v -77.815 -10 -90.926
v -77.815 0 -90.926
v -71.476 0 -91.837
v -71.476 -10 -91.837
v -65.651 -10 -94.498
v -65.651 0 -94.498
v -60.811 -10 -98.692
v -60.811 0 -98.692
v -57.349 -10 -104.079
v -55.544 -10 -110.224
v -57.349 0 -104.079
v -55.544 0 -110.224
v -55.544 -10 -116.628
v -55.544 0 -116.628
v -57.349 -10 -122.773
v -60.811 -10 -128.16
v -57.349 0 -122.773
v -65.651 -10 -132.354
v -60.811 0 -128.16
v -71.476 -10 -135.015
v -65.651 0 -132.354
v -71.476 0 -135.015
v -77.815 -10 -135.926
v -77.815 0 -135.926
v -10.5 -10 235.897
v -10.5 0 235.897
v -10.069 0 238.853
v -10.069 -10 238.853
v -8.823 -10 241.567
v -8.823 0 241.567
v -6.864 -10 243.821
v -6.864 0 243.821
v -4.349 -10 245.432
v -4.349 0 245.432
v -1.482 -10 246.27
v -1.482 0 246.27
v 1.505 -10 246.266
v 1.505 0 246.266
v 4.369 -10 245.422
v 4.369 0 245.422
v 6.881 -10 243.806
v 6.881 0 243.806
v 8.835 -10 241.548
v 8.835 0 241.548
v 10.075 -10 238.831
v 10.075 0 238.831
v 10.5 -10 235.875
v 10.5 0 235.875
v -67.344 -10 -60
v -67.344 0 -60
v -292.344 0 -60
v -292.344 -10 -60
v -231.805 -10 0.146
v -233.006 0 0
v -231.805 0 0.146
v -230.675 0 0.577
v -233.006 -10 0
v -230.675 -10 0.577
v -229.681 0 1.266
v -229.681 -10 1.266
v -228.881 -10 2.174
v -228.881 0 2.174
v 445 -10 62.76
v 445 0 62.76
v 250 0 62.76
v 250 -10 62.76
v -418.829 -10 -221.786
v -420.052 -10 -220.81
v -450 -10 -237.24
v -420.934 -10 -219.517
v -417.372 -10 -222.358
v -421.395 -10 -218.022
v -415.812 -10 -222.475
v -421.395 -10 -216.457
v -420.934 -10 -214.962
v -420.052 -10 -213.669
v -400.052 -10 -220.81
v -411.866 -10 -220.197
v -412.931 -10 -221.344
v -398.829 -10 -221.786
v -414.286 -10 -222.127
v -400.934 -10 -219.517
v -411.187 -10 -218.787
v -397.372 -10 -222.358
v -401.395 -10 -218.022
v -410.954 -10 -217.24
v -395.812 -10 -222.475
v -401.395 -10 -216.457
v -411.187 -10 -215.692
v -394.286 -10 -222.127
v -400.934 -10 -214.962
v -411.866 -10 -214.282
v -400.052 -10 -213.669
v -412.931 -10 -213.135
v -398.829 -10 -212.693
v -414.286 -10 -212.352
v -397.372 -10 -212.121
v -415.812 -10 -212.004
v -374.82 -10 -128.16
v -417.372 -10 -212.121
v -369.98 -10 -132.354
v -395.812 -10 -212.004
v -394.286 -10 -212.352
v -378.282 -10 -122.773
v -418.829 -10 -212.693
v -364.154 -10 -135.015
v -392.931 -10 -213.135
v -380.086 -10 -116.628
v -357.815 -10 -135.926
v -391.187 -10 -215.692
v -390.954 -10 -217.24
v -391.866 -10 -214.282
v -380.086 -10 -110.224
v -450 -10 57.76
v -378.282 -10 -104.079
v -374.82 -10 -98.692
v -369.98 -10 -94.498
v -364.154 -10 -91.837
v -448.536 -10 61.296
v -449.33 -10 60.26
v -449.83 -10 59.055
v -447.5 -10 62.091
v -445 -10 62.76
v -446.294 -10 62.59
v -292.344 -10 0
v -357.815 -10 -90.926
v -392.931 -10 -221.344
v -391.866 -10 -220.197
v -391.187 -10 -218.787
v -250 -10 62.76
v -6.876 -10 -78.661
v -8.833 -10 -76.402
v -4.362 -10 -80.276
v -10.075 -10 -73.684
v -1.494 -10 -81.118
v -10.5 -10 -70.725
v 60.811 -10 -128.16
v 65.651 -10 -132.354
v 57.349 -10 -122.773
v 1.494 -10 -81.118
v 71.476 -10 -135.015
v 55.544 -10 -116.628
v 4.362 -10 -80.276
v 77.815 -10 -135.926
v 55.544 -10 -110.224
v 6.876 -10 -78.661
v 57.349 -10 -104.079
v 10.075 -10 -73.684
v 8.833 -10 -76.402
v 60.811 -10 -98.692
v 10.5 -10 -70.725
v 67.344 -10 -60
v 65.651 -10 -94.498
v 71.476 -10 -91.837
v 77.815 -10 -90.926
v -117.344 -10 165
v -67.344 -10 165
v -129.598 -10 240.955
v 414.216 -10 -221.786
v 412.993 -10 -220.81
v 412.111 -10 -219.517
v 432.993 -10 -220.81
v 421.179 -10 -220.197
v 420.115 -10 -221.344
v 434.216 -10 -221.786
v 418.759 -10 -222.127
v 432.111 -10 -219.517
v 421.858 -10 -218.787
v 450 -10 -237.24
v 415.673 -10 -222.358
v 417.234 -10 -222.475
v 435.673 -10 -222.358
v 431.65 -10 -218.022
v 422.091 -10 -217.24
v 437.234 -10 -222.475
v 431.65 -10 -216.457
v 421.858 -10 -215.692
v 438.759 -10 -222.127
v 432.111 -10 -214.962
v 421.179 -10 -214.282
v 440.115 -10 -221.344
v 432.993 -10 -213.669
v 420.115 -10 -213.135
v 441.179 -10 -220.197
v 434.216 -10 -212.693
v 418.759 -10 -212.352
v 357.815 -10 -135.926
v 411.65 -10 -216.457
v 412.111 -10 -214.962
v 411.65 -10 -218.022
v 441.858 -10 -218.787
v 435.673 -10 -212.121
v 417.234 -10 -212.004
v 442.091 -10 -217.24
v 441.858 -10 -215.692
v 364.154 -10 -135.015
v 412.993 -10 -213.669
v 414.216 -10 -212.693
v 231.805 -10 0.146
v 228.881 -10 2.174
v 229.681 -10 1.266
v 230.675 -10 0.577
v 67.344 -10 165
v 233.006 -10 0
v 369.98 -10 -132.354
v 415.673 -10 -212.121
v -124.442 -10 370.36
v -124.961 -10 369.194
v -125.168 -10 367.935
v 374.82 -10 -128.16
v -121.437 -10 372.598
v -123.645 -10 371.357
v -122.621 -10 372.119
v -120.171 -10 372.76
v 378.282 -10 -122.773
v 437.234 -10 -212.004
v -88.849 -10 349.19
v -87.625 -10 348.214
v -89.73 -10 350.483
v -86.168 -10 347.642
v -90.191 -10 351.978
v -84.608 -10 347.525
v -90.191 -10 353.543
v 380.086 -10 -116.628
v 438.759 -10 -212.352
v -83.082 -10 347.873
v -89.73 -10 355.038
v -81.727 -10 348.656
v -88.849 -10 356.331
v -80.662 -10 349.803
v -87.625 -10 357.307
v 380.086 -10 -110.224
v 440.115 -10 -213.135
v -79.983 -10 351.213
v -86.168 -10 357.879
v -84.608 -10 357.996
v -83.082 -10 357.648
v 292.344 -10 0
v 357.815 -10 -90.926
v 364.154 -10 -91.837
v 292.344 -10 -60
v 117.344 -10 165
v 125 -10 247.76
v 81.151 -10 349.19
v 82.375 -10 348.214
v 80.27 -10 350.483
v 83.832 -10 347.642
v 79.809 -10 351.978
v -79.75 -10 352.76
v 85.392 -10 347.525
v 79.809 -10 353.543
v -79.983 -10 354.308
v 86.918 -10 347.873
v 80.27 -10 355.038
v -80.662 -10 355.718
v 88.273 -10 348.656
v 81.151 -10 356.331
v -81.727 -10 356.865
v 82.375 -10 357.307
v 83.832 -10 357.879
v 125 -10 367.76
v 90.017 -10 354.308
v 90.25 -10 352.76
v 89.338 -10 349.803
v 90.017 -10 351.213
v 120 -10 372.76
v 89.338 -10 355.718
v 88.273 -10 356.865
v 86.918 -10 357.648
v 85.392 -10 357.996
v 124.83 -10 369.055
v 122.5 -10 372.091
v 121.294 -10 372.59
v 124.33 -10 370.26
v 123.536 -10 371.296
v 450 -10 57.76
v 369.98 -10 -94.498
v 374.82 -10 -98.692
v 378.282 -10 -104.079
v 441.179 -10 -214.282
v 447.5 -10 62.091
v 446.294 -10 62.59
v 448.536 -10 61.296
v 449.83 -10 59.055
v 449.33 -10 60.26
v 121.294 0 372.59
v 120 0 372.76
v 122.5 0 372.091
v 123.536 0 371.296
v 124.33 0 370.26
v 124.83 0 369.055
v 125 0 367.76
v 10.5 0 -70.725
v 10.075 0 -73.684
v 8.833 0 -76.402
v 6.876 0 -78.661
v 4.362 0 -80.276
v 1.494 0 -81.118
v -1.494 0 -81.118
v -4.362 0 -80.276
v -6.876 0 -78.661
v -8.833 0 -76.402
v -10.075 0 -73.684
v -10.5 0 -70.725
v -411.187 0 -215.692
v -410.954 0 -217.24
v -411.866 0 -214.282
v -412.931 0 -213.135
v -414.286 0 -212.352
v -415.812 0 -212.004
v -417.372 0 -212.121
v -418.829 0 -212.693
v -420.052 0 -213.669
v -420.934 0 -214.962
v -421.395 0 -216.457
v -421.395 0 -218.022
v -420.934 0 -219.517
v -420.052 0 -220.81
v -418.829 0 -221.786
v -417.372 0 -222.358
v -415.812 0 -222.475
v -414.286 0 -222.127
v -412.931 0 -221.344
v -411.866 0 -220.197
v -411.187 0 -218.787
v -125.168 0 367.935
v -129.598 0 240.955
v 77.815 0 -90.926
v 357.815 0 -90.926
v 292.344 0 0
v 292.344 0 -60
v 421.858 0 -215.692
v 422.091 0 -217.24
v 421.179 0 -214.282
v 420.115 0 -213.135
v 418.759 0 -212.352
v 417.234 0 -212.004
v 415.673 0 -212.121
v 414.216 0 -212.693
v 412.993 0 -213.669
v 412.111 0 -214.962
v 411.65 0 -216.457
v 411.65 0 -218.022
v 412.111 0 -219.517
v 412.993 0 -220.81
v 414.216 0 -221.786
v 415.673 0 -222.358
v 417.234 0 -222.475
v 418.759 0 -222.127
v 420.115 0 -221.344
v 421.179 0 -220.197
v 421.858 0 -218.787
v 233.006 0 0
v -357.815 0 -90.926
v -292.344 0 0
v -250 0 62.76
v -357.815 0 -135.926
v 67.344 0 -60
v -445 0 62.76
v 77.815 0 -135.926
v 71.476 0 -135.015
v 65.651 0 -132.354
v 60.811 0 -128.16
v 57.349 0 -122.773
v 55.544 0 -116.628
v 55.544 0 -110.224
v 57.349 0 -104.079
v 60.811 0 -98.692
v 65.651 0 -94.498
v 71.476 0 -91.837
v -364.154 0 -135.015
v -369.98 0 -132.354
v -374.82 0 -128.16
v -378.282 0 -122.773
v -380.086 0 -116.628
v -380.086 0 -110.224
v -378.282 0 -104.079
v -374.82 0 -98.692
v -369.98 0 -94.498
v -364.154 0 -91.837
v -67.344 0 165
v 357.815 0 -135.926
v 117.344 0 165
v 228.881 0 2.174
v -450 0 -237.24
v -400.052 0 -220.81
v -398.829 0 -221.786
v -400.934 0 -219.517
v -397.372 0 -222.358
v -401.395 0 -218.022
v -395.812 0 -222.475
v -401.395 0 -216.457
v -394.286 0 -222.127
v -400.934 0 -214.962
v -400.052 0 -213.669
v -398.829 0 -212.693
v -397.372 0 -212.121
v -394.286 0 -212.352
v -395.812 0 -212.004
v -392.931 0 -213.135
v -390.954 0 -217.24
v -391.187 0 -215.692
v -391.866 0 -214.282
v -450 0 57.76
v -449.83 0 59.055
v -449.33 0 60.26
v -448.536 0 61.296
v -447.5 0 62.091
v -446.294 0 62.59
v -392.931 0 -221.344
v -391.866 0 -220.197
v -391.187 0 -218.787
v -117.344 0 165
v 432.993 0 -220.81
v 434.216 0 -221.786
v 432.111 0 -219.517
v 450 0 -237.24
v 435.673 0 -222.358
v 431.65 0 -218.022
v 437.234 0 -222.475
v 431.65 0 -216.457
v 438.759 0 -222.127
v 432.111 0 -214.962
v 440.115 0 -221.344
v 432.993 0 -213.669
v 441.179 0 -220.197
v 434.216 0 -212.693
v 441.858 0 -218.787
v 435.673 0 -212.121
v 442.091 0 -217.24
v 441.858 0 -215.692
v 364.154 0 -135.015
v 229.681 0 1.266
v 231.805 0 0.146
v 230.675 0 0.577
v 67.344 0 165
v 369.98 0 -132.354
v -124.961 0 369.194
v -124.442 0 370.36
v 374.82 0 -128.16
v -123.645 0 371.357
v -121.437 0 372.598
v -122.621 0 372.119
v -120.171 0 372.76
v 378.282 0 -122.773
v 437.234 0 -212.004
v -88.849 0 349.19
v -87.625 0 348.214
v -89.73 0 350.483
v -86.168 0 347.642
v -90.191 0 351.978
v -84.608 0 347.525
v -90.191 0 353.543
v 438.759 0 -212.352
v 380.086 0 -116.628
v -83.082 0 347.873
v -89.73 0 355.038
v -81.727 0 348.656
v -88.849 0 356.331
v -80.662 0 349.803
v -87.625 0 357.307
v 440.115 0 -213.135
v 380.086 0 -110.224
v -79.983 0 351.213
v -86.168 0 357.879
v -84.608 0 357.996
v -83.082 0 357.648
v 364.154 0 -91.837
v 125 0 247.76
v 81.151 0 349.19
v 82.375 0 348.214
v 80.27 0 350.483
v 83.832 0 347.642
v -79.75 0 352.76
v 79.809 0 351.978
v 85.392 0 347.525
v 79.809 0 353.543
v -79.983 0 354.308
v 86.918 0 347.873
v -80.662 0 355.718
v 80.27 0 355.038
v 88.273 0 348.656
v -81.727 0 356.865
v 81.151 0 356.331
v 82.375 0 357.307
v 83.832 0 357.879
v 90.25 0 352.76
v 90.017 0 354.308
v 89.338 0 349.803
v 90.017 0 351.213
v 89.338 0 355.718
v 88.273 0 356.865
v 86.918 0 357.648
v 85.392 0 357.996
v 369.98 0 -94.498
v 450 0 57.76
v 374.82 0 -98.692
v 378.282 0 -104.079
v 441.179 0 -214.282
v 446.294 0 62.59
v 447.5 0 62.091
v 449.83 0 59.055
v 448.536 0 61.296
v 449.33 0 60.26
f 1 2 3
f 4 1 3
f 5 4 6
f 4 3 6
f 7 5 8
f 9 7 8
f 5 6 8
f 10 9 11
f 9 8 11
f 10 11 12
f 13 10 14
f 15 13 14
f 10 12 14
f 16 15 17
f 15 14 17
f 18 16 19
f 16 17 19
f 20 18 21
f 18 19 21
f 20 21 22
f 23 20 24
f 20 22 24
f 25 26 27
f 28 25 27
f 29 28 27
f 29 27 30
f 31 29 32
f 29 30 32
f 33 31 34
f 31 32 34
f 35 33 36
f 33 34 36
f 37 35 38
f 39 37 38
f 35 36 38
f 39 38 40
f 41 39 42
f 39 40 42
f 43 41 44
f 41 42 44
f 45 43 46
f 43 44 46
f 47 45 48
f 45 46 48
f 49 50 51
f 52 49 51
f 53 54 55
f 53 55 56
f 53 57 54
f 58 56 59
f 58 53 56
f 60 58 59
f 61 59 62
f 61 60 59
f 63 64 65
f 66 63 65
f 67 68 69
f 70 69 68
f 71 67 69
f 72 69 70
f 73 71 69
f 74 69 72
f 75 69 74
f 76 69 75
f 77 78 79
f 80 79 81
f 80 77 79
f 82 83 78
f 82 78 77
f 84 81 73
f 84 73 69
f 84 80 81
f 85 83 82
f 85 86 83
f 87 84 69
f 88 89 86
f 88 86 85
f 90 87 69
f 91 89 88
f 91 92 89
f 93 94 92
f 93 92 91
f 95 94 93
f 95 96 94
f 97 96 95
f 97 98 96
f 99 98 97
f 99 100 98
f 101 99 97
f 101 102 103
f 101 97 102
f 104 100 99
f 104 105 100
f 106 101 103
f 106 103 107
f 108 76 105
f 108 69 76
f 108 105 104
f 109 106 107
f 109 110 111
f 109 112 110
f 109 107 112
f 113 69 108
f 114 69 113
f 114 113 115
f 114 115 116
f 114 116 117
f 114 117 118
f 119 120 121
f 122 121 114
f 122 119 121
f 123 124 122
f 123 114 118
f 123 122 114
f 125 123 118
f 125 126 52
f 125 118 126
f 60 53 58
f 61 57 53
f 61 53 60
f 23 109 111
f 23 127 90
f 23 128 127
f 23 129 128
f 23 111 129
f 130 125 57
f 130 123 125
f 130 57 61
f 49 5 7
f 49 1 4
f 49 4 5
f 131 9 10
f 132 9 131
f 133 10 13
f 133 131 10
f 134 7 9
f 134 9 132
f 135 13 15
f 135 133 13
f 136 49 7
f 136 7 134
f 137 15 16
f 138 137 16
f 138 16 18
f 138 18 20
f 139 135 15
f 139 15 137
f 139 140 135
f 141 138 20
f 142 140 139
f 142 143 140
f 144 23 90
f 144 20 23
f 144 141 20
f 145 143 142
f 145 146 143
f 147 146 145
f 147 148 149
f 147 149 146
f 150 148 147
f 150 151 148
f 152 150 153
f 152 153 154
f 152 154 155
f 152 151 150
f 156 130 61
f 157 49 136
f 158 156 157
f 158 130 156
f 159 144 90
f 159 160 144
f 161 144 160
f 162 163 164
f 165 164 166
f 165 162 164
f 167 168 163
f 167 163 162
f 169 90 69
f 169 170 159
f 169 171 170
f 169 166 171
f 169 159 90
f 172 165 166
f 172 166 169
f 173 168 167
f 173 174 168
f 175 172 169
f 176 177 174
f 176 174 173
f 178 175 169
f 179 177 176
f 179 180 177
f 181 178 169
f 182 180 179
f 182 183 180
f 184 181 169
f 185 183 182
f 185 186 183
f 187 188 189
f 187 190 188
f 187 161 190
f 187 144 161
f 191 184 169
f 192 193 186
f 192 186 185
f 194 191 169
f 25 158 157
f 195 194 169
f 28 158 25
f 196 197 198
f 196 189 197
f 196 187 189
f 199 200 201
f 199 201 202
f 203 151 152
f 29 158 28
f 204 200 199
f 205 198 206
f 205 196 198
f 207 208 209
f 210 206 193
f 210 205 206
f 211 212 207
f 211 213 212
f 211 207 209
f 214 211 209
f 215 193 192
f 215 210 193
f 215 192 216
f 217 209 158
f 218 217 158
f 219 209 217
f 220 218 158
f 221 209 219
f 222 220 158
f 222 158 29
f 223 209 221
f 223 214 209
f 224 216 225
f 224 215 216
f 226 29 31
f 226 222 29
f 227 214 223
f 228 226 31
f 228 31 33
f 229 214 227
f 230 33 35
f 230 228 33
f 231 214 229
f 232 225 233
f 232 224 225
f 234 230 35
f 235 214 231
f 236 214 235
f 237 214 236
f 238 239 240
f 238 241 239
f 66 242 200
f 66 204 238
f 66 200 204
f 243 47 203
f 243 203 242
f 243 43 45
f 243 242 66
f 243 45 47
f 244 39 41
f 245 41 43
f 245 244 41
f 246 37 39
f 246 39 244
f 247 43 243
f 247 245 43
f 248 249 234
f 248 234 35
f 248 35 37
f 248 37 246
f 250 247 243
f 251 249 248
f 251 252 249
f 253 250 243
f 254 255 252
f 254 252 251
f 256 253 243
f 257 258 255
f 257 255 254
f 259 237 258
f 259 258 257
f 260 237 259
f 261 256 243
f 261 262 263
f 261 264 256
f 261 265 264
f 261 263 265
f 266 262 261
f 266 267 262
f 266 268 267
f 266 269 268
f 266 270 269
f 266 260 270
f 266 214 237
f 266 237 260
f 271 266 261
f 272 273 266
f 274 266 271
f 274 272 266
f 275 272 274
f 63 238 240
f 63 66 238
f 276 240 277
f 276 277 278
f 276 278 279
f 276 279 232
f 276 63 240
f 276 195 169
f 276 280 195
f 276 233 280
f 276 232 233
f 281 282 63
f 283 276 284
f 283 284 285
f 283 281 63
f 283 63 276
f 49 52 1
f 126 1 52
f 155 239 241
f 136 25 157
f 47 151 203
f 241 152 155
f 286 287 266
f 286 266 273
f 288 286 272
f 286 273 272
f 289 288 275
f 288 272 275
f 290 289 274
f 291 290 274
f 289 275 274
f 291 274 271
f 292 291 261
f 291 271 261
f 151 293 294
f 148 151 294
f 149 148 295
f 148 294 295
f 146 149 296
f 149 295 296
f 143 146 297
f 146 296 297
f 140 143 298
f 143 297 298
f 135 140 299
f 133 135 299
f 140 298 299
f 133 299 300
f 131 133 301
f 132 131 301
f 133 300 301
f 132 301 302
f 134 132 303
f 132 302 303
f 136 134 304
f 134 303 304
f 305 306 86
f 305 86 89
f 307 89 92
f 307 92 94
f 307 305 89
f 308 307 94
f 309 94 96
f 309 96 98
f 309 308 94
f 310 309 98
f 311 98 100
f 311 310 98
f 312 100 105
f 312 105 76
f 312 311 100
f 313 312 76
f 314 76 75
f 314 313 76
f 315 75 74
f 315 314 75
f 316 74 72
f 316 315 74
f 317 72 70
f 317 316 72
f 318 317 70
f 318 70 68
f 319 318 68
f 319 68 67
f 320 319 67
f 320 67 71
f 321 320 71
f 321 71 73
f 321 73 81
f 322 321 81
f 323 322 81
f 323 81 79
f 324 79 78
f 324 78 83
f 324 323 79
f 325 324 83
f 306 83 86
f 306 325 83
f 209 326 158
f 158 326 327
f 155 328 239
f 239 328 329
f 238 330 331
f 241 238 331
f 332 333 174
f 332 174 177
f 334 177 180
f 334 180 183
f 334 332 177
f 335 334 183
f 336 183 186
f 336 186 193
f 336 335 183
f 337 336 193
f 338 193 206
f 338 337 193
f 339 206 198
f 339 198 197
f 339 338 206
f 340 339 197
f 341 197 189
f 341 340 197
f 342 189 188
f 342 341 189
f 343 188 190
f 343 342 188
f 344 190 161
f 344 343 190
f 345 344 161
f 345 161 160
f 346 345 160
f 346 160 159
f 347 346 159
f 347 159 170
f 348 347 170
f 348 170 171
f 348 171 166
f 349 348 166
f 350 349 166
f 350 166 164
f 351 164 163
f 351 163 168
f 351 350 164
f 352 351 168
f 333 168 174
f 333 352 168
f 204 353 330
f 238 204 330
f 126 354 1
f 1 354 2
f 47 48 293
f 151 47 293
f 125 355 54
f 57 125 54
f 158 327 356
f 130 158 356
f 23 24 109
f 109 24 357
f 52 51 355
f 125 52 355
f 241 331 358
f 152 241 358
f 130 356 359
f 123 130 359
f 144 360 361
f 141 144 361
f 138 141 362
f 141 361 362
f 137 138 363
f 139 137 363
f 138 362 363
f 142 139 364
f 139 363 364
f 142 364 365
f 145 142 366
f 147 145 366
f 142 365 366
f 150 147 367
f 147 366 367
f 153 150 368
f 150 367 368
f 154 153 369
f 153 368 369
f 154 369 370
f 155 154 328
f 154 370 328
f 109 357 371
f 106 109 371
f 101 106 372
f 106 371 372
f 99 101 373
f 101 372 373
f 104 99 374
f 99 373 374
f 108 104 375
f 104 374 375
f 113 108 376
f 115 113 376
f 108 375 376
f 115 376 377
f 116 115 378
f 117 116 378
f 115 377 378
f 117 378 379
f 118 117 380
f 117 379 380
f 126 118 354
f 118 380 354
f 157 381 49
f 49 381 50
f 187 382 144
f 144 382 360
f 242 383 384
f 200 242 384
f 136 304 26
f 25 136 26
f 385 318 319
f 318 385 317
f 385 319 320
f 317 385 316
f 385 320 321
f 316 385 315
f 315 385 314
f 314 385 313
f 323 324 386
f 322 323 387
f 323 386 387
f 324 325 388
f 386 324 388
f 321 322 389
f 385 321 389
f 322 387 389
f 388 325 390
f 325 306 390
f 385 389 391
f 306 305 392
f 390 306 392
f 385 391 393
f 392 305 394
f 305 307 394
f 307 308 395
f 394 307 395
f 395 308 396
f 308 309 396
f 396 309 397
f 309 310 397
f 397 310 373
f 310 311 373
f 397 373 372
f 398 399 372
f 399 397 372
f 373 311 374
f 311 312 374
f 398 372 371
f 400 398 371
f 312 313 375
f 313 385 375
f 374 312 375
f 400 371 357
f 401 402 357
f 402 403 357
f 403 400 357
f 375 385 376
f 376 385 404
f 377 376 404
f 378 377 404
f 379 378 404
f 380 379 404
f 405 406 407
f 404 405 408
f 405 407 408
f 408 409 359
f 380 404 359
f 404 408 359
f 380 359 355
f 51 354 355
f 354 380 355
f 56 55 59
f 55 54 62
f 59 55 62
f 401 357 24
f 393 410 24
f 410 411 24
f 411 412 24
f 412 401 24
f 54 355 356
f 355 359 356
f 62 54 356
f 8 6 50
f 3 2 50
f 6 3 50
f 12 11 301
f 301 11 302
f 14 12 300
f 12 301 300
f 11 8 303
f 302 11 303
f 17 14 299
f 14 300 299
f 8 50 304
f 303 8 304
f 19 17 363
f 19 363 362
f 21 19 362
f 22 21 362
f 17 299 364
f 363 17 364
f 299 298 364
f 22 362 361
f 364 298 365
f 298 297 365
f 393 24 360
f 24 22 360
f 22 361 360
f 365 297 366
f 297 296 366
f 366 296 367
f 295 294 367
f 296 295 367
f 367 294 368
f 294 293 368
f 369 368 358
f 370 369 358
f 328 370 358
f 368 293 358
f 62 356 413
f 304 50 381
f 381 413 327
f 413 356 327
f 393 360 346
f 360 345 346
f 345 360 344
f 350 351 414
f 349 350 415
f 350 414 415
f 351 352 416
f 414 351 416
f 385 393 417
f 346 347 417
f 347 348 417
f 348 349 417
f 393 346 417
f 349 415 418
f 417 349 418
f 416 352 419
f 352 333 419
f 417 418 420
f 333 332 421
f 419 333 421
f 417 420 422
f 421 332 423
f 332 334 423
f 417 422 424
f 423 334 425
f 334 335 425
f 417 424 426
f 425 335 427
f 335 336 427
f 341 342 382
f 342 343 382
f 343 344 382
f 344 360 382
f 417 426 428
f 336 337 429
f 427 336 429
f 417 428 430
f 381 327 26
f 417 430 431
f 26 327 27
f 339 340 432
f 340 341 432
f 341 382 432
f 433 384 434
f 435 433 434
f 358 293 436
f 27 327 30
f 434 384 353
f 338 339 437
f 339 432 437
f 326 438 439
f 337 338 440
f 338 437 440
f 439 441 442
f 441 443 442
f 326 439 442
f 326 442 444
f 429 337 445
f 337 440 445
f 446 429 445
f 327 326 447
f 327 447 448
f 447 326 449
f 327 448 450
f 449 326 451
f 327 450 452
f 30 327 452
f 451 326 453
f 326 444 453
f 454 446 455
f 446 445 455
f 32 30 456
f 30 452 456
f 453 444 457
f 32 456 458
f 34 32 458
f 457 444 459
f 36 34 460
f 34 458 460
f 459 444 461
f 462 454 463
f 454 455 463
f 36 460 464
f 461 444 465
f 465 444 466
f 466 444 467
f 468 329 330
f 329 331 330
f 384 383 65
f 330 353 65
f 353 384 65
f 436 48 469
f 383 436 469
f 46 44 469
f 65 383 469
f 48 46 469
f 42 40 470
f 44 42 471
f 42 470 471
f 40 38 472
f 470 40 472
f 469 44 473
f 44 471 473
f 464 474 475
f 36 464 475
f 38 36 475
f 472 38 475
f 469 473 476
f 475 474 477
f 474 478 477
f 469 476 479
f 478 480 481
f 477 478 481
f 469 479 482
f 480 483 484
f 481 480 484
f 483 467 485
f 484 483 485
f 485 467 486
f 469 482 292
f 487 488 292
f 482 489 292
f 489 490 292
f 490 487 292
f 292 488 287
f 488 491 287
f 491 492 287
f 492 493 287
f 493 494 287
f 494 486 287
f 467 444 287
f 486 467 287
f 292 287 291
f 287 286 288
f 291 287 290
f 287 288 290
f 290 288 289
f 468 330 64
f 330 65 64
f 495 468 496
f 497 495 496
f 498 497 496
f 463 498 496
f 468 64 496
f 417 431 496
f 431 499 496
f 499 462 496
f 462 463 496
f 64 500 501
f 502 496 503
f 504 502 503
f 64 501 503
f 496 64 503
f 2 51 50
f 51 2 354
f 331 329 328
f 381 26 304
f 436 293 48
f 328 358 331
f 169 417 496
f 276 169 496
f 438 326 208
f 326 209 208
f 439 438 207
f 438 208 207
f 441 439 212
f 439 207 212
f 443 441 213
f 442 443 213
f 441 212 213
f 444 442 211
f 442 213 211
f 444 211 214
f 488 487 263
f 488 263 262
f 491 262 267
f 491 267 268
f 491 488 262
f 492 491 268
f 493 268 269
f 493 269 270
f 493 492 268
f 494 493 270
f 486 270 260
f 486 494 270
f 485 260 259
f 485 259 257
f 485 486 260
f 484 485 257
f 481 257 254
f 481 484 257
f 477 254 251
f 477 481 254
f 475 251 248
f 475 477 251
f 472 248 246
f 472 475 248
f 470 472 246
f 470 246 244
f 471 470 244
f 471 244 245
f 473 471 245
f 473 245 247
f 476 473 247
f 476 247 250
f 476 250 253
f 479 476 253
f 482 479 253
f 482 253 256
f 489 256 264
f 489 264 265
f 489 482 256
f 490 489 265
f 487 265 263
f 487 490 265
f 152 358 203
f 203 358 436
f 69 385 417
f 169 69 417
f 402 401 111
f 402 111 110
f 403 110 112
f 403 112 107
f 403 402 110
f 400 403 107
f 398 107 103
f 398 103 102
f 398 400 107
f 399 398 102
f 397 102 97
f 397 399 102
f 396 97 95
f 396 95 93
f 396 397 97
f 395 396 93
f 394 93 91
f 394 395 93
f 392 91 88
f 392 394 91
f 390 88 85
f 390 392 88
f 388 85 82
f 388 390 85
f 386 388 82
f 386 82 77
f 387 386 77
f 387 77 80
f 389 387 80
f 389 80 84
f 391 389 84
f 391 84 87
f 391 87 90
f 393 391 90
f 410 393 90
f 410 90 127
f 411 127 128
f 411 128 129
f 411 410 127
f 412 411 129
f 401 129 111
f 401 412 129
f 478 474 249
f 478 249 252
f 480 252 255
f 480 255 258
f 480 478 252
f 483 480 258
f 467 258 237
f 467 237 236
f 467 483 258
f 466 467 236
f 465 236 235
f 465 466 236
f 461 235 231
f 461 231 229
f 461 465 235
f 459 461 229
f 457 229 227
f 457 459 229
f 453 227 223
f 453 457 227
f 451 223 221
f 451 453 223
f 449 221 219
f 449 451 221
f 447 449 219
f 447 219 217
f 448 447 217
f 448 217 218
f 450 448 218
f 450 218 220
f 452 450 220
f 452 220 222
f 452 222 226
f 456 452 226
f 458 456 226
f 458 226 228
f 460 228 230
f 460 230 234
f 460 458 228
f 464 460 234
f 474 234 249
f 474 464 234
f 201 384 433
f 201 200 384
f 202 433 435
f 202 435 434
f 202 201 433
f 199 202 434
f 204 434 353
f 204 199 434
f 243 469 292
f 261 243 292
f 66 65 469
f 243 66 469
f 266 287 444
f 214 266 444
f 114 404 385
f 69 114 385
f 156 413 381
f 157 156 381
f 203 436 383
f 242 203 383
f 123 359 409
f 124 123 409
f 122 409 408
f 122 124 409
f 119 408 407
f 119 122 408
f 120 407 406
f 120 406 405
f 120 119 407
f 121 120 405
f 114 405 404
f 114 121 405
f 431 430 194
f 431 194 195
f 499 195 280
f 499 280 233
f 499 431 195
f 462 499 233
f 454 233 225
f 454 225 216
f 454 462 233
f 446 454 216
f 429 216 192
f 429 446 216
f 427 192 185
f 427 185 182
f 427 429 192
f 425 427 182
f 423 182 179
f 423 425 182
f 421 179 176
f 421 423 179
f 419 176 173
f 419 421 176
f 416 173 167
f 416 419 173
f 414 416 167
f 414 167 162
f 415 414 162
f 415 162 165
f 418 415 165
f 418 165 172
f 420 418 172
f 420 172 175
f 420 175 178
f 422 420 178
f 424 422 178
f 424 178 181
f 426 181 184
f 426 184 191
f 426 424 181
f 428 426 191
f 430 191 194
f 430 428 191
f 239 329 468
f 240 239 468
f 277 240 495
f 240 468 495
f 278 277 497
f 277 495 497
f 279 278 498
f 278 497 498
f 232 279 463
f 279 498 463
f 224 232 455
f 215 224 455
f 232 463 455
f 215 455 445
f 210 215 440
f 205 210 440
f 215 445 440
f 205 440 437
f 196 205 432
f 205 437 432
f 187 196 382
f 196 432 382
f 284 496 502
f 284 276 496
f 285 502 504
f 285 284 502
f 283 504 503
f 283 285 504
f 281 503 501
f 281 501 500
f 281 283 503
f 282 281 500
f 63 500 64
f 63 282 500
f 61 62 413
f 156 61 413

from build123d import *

# Parameters (mm, degrees)
F0_R     = 5.25
F1_DEPTH = 10
F2_R     = 5
F3_R     = 5


# Not quite as in the source:
# - ends of sketch curves that miss each other by under 0.0002 mm in the source are joined


with BuildPart() as f1:
    # F0 (on Front) → F1 (new body)
    with BuildSketch(Plane.XZ):
        Polygon((-250, 62.7604842186), (-450, 62.7604842186), (-450, -237.2395157814), (0, -237.2395157814), (450, -237.2395157814), (450, 62.7604842186), (250, 62.7604842186), (125, 247.7604842186), (125, 372.7604842186), (-125, 372.7604842186), (-129.5981111256, 240.9552797528), align=None)
        with Locations((-416.2039160728, -217.2395157814)):
            Circle(F0_R, mode=Mode.SUBTRACT)
        with Locations((-396.2039160728, -217.2395157814)):
            Circle(F0_R, mode=Mode.SUBTRACT)
        with BuildLine():
            Line((-357.8152358532, -90.9260827303), (-77.8152358532, -90.9260827303))
            ThreePointArc((-77.8152358532, -90.9260827303), (-55.3152358532, -113.4260827303), (-77.8152358532, -135.9260827303))
            Line((-77.8152358532, -135.9260827303), (-357.8152358532, -135.9260827303))
            ThreePointArc((-357.8152358532, -135.9260827303), (-380.3152358532, -113.4260827303), (-357.8152358532, -90.9260827303))
        make_face(mode=Mode.SUBTRACT)
        Polygon((-292.343990892, -60), (-292.343990892, 0), (-230.3705364466, 0), (-117.343990892, 165), (-67.343990892, 165), (-67.343990892, 0), (-67.343990892, -60), align=None, mode=Mode.SUBTRACT)
        with BuildLine():
            ThreePointArc((77.8152358532, -135.9260827303), (55.3152358532, -113.4260827303), (77.8152358532, -90.9260827303))
            Line((77.8152358532, -90.9260827303), (357.8152358532, -90.9260827303))
            ThreePointArc((357.8152358532, -90.9260827303), (380.3152358532, -113.4260827303), (357.8152358532, -135.9260827303))
            Line((357.8152358532, -135.9260827303), (77.8152358532, -135.9260827303))
        make_face(mode=Mode.SUBTRACT)
        with Locations((416.8414473534, -217.2395157814)):
            Circle(F0_R, mode=Mode.SUBTRACT)
        with Locations((436.8414473534, -217.2395157814)):
            Circle(F0_R, mode=Mode.SUBTRACT)
        Polygon((67.343990892, 0), (67.343990892, 165), (117.343990892, 165), (230.3705364466, 0), (292.343990892, 0), (292.343990892, -60), (67.343990892, -60), align=None, mode=Mode.SUBTRACT)
        with Locations((-85, 352.7604842186)):
            Circle(F0_R, mode=Mode.SUBTRACT)
        with BuildLine():
            Line((-10.5, 235.874648428), (-10.5, 235.897347331))
            ThreePointArc((-10.5, 235.897347331), (0.0113494317, 246.3746422942), (10.5, 235.874648428))
            Line((10.5, 235.874648428), (10.5, 0.0226989031))
            Line((10.5, 0.0226989031), (10.5, -70.725351572))
            ThreePointArc((10.5, -70.725351572), (0, -81.225351572), (-10.5, -70.725351572))
            Line((-10.5, -70.725351572), (-10.5, 0))
            Line((-10.5, 0), (-10.5, 235.874648428))
        make_face(mode=Mode.SUBTRACT)
        with Locations((85, 352.7604842186)):
            Circle(F0_R, mode=Mode.SUBTRACT)
    extrude(amount=F1_DEPTH)

    # F2
    f2_edges = [f1.edges().sort_by_distance(p)[0] for p in [
        (-230.370536, -5, 0),
        (230.370536, -5, 0),
    ]]
    fillet(f2_edges, radius=F2_R)

    # F3
    f3_edges = [f1.edges().sort_by_distance(p)[0] for p in [
        (-450, -5, 62.760484),
        (-125, -5, 372.760484),
        (125, -5, 372.760484),
        (450, -5, 62.760484),
    ]]
    fillet(f3_edges, radius=F3_R)


solid = f1.part
